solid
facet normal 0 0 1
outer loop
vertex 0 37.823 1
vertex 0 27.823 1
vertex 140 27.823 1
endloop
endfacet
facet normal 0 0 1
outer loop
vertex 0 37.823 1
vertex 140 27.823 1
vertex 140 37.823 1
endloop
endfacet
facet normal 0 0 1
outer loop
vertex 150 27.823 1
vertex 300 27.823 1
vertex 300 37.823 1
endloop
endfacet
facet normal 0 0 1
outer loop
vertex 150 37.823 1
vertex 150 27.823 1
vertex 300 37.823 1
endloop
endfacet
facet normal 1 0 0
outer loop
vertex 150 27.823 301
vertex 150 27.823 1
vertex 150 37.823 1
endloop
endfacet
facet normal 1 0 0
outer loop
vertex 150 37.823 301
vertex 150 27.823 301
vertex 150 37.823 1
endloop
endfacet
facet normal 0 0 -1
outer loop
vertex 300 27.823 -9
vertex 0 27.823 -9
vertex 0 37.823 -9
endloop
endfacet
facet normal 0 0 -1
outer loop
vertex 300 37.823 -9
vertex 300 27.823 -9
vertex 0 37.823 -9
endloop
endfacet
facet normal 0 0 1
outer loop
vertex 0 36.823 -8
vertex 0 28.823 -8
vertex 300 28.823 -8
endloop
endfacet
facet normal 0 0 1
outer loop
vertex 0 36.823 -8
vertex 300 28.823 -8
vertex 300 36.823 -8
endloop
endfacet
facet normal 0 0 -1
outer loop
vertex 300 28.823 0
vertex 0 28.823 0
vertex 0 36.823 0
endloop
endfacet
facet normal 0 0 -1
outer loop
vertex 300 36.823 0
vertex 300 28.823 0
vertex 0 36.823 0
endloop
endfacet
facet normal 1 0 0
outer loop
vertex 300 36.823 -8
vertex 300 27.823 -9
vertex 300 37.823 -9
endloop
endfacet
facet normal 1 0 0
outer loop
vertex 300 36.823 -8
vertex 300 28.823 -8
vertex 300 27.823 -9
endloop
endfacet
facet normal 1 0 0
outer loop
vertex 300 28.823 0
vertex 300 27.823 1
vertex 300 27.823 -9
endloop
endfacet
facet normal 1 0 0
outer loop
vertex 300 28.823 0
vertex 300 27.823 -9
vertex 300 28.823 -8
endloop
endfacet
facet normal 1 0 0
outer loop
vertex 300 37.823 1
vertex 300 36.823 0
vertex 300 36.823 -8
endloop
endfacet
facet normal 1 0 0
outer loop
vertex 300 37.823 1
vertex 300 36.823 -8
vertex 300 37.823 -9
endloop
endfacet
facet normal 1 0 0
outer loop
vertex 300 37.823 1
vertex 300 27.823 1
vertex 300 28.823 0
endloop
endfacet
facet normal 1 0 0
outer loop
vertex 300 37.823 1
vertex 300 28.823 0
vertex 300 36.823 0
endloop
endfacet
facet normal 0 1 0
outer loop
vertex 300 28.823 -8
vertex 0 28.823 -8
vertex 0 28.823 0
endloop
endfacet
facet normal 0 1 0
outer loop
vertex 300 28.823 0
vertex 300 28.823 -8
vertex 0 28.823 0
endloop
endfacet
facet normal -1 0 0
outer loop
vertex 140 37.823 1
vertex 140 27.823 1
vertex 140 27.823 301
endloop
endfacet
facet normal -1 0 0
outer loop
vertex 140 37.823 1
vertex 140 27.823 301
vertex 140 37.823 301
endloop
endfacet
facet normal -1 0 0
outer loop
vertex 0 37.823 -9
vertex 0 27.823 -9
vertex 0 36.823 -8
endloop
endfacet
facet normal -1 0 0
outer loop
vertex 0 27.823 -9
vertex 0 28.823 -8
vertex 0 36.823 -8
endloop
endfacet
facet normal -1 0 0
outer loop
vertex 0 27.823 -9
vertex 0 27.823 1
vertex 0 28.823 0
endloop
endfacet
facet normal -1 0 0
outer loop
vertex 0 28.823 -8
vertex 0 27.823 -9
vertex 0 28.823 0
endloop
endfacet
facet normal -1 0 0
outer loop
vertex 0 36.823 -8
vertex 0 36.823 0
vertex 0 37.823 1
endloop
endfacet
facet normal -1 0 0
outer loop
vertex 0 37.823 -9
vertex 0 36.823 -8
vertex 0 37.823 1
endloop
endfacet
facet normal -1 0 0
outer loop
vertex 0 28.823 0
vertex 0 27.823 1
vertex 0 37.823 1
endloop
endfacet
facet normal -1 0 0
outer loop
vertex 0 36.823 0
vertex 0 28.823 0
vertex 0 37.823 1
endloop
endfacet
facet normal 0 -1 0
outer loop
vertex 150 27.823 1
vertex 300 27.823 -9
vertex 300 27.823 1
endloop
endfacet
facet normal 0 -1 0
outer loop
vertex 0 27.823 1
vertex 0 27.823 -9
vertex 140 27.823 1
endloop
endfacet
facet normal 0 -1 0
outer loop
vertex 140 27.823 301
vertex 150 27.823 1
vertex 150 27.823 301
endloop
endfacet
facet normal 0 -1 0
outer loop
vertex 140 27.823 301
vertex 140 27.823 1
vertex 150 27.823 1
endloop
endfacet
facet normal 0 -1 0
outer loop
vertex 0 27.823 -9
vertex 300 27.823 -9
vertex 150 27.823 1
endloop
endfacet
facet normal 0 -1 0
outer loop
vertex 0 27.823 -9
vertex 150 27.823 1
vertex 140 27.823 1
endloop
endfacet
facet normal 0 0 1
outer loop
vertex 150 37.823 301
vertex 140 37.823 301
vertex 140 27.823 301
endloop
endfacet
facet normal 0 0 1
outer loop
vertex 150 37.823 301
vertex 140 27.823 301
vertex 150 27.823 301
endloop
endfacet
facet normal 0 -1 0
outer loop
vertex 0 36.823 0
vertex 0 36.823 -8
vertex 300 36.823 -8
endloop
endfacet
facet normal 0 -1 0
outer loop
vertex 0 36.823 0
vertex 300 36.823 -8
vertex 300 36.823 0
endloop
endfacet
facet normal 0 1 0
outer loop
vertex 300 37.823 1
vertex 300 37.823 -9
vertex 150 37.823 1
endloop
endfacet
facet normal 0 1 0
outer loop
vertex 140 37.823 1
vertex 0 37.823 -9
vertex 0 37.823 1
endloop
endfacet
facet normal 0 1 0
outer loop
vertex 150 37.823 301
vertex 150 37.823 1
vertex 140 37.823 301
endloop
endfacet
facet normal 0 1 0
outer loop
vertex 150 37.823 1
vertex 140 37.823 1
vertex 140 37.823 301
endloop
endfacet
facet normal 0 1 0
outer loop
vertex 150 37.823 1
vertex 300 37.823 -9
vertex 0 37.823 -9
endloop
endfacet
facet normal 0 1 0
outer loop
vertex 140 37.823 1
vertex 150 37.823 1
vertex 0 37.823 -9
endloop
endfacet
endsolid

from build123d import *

# Parameters (mm, degrees)
F0_W     = 10
F0_H     = 10
F0_W_2   = 8
F0_H_2   = 8
F1_DEPTH = 300
F2_W     = 10
F2_H     = 10
F3_DEPTH = 300


with BuildPart() as f1:
    # F0 (on Right) → F1 (new body)
    with BuildSketch(Plane.YZ):
        with Locations((32.823025, -4)):
            Rectangle(F0_W, F0_H)
        with Locations((32.823025, -4)):
            Rectangle(F0_W_2, F0_H_2, mode=Mode.SUBTRACT)
    extrude(amount=F1_DEPTH)

    # F2 (on face) → F3 (join)
    with BuildSketch(Plane.XY.offset(1)):
        with Locations((145, 32.823025)):
            Rectangle(F2_W, F2_H)
    extrude(amount=F3_DEPTH)


solid = f1.part
